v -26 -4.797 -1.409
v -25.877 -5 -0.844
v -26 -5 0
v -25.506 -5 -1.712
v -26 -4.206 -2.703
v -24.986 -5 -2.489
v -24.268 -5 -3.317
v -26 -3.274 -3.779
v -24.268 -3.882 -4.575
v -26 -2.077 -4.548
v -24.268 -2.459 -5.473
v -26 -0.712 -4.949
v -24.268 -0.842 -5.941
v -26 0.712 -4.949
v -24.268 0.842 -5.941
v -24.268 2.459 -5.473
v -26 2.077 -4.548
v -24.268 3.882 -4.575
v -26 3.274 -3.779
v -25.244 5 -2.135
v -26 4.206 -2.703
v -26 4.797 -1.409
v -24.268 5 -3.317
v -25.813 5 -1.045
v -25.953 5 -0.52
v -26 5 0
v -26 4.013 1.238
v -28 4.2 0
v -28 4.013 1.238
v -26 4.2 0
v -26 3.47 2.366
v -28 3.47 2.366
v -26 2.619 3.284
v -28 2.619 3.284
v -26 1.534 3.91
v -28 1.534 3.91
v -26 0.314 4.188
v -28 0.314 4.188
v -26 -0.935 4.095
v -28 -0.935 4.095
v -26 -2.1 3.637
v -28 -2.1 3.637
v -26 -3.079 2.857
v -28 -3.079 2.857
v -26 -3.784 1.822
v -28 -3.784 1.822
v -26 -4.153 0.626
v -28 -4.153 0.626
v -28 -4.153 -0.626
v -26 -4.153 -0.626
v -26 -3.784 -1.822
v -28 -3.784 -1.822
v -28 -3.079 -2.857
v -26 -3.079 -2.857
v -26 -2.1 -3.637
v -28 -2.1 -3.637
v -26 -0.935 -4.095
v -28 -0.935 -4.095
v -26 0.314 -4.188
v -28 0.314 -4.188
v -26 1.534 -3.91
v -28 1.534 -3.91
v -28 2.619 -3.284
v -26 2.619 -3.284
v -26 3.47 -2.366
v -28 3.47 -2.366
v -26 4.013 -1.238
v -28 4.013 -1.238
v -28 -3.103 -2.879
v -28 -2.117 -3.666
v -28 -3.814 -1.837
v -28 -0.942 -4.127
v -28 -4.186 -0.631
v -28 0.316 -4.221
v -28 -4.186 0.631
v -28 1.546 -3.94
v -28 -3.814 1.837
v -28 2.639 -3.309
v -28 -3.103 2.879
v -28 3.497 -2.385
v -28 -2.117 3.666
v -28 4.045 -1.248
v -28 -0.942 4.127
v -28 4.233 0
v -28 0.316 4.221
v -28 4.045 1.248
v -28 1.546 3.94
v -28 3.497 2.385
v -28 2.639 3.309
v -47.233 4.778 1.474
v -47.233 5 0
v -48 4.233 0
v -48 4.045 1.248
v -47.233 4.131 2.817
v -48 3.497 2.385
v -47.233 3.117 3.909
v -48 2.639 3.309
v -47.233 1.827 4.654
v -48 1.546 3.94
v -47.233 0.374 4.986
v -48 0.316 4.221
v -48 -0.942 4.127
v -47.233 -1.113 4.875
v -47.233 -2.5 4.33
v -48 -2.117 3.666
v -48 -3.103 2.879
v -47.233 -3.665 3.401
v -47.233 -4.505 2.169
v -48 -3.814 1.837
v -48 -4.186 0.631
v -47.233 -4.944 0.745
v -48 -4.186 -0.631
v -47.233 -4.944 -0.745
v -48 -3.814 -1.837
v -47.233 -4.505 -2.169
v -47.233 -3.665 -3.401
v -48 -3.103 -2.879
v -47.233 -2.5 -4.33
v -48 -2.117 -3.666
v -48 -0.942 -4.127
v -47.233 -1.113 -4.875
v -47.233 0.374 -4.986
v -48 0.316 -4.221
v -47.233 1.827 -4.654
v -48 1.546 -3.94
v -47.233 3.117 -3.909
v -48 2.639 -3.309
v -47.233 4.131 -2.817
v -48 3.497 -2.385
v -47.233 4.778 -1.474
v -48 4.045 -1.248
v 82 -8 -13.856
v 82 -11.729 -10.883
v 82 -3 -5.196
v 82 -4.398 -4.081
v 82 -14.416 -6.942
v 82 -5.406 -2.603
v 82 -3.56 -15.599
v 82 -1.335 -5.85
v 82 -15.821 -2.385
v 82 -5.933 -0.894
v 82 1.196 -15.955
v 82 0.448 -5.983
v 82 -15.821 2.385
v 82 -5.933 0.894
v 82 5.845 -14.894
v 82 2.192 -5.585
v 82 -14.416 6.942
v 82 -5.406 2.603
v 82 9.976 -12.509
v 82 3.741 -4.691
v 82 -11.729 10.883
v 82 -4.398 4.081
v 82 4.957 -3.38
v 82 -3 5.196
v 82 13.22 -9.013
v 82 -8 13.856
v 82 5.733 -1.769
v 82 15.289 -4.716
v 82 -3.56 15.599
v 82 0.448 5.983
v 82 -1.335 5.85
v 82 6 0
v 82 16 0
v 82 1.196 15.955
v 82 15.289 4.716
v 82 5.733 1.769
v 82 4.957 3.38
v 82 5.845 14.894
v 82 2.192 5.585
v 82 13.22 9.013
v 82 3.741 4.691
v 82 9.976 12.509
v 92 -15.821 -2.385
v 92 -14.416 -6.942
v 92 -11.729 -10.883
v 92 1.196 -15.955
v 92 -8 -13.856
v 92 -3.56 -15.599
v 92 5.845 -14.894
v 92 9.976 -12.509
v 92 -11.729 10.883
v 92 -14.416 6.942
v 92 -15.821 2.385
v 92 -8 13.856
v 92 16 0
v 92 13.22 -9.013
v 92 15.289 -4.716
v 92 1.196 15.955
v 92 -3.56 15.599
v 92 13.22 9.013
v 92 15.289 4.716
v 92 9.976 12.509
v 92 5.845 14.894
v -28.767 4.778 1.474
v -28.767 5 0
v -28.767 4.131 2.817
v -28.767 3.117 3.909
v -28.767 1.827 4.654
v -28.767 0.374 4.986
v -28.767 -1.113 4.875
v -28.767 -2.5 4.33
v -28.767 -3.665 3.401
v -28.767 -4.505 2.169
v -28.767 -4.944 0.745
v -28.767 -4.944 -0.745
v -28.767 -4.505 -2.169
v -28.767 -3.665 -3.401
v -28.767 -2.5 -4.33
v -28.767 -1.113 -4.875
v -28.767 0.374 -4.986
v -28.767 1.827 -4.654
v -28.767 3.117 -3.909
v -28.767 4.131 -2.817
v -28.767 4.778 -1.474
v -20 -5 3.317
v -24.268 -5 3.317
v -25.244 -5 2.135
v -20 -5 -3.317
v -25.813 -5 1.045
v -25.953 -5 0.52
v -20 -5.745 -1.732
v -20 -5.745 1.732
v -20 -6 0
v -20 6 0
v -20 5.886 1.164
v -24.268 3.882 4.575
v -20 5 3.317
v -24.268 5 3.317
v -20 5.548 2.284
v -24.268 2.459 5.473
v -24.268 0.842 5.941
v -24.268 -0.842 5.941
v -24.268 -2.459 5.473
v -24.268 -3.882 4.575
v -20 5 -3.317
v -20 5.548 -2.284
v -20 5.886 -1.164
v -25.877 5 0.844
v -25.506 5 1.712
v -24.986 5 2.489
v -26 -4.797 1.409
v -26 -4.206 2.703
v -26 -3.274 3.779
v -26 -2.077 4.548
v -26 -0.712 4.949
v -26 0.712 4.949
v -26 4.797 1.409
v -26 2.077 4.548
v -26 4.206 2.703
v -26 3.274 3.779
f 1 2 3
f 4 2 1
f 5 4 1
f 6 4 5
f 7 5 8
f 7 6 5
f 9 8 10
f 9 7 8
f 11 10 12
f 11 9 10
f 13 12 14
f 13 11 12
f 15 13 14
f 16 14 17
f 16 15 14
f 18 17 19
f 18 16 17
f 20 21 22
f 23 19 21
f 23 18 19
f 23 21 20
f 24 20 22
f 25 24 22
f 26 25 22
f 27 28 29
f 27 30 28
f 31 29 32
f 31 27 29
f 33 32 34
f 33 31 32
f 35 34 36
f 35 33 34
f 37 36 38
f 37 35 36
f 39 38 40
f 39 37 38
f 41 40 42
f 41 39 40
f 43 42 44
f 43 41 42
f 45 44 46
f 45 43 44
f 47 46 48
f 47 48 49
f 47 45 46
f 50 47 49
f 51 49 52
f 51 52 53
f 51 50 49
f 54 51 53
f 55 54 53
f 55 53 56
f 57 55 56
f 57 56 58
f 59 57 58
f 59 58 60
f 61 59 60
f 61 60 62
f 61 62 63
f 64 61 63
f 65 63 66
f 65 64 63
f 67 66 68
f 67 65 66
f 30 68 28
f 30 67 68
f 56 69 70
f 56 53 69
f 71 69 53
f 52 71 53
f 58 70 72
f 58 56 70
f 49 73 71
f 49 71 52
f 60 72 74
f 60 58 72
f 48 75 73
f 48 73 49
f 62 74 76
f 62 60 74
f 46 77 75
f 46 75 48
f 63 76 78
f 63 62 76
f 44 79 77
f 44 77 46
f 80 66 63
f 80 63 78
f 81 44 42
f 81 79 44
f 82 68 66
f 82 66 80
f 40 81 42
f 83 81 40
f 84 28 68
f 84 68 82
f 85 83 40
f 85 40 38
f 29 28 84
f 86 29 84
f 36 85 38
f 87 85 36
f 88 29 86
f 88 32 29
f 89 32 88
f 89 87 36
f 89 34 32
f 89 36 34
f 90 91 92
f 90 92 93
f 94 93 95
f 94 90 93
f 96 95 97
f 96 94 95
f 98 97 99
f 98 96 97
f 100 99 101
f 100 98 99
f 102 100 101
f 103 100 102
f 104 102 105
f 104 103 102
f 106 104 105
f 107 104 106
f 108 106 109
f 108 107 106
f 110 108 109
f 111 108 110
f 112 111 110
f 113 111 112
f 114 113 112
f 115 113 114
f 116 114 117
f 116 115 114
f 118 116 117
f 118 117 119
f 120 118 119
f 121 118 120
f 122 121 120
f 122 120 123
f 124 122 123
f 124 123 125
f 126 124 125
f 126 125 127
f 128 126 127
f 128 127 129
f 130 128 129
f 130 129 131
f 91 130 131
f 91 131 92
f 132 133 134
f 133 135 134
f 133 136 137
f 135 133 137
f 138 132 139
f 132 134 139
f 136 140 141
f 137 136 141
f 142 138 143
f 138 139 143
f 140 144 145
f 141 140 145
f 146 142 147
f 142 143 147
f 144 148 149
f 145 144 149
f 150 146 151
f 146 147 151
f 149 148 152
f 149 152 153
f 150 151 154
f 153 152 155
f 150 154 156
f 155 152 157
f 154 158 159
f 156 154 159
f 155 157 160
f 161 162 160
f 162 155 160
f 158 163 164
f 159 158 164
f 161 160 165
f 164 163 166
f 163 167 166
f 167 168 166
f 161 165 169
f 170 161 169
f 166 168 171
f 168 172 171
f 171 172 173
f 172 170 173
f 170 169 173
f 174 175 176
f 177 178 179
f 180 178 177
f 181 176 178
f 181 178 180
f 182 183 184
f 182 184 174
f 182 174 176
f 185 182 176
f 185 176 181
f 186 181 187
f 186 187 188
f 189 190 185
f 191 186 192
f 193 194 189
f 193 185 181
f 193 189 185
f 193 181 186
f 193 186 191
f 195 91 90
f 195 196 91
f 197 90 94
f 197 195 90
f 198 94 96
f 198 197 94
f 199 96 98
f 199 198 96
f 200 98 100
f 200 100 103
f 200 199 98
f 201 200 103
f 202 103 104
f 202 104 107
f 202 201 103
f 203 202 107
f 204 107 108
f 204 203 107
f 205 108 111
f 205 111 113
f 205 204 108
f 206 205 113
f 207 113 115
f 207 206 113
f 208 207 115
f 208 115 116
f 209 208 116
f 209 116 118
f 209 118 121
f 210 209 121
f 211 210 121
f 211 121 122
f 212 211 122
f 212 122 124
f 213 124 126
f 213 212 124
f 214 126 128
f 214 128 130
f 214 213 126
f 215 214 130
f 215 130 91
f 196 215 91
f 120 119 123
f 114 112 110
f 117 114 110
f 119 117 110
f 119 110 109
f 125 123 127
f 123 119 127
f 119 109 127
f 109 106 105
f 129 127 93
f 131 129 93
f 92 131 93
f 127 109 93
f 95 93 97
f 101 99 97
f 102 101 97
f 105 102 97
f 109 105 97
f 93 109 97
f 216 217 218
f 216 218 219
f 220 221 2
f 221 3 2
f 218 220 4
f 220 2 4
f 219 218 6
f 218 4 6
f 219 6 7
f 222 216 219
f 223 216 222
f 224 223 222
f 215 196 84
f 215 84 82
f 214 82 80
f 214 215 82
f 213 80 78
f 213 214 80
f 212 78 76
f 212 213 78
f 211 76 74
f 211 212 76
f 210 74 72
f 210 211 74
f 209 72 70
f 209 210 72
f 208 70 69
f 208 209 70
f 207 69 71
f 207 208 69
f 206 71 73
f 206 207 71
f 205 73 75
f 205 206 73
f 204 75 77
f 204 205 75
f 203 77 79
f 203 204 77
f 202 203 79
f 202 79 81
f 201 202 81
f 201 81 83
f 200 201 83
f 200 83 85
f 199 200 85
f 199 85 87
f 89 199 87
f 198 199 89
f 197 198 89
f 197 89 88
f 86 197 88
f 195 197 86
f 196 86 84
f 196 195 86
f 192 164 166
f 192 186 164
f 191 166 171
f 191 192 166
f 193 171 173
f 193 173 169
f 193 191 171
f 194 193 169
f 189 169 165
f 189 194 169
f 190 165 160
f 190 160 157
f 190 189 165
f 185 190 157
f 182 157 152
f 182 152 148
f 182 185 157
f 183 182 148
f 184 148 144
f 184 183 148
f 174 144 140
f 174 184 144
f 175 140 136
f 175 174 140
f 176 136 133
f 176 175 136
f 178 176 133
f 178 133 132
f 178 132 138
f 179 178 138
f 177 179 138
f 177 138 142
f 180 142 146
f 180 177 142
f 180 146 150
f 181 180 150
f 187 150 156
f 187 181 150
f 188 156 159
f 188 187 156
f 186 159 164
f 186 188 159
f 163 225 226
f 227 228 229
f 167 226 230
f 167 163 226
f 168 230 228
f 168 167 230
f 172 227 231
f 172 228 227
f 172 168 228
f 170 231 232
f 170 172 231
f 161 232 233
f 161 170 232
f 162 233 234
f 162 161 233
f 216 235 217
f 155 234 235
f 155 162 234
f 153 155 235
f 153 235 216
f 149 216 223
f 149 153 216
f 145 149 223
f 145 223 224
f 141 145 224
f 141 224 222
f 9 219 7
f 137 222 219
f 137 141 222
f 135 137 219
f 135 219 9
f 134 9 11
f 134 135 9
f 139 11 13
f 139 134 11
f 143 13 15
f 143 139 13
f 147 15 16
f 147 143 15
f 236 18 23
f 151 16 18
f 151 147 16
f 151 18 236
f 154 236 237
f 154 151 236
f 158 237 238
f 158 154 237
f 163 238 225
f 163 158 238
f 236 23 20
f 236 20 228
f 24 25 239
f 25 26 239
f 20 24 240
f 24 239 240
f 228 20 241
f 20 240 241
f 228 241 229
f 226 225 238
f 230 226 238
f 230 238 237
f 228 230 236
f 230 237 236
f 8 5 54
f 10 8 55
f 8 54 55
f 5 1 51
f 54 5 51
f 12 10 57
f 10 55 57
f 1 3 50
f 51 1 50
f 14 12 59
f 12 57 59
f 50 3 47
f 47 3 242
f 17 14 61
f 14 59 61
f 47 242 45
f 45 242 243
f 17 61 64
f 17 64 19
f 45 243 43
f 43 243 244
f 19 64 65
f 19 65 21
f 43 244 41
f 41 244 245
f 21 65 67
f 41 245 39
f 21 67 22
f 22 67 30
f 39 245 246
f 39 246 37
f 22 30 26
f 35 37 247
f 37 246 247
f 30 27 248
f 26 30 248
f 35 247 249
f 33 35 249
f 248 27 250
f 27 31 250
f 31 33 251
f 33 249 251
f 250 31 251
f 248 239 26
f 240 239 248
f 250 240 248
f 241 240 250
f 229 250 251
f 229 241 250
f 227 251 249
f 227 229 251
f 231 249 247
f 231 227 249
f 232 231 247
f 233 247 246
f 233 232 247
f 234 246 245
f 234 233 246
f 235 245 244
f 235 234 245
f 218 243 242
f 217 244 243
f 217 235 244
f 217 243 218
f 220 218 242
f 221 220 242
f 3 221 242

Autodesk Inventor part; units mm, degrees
sketch "Sketch_1" plane through (0, 0, 0) normal (0, 0, 1) x (1, 0, 0)
  line L0 (92, 0) -> (-48, 0)
  line L1 (-48, 0) -> (-48, 4.233)
  line L2 (-48, 4.233) -> (-47.233, 5)
  line L3 (-47.233, 5) -> (-28.767, 5)
  line L4 (-28.767, 5) -> (-28, 4.233)
  line L5 (-28, 4.233) -> (-28, 4.2)
  line L6 (-28, 4.2) -> (-26, 4.2)
  line L7 (-26, 4.2) -> (-26, 5)
  line L8 (-26, 5) -> (-24.2679, 6)
  line L9 (-24.2679, 6) -> (82, 6)
  line L10 (82, 6) -> (82, 16)
  line L11 (82, 16) -> (92, 16)
  line L12 (92, 16) -> (92, 0)
  line L13 (92, 0) -> (-48, 0)
revolve "Revolution1" add sketch "Sketch_1" angle 360 about axis through (92, 0, 0) along (1, 0, 0)
thread "Thread1" size "M10x1.25" class "6g" standard "ISO Metric profile" full length
sketch "Sketch_4" plane through (-26, 0, 0) normal (1, 0, 0) x (0, 0, -1)
  line L0 (-13, -10) -> (13, -10)
  line L1 (13, -10) -> (13, 10)
  line L2 (13, 10) -> (-13, 10)
  line L3 (-13, 10) -> (-13, -10)
  line L4 (-8, 5) -> (-8, -5)
  line L5 (-8, -5) -> (8, -5)
  line L6 (8, -5) -> (8, 5)
  line L7 (8, 5) -> (-8, 5)
extrude "Extrusion1" cut sketch "Sketch_4" along normal blind 6
ref_plane "A4_XY" through (220, 0, 0) normal (0, 1, 0) x (1, 0, 0)
ref_plane "A4_YZ" through (220, 0, 0) normal (1, 0, 0) x (0, 0, -1)
ref_plane "A4_ZX" through (220, 0, 0) normal (0, 0, -1) x (0, 1, 0)
ref_plane "ROD_BODY_XY" through (0, 0, 0) normal (1, 0, 0) x (0, 0, -1)
ref_plane "ROD_BODY_YZ" through (0, 0, 0) normal (0, 0, -1) x (0, 1, 0)
ref_plane "ROD_BODY_ZX" through (0, 0, 0) normal (0, 1, 0) x (1, 0, 0)
ref_plane "ROD_NUT_XY" through (-48, 0, 0) normal (-1, 0, 0) x (0, 0, -1)
ref_plane "ROD_NUT_YZ" through (-48, 0, 0) normal (0, 0, -1) x (0, -1, 0)
ref_plane "ROD_NUT_ZX" through (-48, 0, 0) normal (0, -1, 0) x (-1, 0, 0)
properties part number "CP96S32-50_ROD"
